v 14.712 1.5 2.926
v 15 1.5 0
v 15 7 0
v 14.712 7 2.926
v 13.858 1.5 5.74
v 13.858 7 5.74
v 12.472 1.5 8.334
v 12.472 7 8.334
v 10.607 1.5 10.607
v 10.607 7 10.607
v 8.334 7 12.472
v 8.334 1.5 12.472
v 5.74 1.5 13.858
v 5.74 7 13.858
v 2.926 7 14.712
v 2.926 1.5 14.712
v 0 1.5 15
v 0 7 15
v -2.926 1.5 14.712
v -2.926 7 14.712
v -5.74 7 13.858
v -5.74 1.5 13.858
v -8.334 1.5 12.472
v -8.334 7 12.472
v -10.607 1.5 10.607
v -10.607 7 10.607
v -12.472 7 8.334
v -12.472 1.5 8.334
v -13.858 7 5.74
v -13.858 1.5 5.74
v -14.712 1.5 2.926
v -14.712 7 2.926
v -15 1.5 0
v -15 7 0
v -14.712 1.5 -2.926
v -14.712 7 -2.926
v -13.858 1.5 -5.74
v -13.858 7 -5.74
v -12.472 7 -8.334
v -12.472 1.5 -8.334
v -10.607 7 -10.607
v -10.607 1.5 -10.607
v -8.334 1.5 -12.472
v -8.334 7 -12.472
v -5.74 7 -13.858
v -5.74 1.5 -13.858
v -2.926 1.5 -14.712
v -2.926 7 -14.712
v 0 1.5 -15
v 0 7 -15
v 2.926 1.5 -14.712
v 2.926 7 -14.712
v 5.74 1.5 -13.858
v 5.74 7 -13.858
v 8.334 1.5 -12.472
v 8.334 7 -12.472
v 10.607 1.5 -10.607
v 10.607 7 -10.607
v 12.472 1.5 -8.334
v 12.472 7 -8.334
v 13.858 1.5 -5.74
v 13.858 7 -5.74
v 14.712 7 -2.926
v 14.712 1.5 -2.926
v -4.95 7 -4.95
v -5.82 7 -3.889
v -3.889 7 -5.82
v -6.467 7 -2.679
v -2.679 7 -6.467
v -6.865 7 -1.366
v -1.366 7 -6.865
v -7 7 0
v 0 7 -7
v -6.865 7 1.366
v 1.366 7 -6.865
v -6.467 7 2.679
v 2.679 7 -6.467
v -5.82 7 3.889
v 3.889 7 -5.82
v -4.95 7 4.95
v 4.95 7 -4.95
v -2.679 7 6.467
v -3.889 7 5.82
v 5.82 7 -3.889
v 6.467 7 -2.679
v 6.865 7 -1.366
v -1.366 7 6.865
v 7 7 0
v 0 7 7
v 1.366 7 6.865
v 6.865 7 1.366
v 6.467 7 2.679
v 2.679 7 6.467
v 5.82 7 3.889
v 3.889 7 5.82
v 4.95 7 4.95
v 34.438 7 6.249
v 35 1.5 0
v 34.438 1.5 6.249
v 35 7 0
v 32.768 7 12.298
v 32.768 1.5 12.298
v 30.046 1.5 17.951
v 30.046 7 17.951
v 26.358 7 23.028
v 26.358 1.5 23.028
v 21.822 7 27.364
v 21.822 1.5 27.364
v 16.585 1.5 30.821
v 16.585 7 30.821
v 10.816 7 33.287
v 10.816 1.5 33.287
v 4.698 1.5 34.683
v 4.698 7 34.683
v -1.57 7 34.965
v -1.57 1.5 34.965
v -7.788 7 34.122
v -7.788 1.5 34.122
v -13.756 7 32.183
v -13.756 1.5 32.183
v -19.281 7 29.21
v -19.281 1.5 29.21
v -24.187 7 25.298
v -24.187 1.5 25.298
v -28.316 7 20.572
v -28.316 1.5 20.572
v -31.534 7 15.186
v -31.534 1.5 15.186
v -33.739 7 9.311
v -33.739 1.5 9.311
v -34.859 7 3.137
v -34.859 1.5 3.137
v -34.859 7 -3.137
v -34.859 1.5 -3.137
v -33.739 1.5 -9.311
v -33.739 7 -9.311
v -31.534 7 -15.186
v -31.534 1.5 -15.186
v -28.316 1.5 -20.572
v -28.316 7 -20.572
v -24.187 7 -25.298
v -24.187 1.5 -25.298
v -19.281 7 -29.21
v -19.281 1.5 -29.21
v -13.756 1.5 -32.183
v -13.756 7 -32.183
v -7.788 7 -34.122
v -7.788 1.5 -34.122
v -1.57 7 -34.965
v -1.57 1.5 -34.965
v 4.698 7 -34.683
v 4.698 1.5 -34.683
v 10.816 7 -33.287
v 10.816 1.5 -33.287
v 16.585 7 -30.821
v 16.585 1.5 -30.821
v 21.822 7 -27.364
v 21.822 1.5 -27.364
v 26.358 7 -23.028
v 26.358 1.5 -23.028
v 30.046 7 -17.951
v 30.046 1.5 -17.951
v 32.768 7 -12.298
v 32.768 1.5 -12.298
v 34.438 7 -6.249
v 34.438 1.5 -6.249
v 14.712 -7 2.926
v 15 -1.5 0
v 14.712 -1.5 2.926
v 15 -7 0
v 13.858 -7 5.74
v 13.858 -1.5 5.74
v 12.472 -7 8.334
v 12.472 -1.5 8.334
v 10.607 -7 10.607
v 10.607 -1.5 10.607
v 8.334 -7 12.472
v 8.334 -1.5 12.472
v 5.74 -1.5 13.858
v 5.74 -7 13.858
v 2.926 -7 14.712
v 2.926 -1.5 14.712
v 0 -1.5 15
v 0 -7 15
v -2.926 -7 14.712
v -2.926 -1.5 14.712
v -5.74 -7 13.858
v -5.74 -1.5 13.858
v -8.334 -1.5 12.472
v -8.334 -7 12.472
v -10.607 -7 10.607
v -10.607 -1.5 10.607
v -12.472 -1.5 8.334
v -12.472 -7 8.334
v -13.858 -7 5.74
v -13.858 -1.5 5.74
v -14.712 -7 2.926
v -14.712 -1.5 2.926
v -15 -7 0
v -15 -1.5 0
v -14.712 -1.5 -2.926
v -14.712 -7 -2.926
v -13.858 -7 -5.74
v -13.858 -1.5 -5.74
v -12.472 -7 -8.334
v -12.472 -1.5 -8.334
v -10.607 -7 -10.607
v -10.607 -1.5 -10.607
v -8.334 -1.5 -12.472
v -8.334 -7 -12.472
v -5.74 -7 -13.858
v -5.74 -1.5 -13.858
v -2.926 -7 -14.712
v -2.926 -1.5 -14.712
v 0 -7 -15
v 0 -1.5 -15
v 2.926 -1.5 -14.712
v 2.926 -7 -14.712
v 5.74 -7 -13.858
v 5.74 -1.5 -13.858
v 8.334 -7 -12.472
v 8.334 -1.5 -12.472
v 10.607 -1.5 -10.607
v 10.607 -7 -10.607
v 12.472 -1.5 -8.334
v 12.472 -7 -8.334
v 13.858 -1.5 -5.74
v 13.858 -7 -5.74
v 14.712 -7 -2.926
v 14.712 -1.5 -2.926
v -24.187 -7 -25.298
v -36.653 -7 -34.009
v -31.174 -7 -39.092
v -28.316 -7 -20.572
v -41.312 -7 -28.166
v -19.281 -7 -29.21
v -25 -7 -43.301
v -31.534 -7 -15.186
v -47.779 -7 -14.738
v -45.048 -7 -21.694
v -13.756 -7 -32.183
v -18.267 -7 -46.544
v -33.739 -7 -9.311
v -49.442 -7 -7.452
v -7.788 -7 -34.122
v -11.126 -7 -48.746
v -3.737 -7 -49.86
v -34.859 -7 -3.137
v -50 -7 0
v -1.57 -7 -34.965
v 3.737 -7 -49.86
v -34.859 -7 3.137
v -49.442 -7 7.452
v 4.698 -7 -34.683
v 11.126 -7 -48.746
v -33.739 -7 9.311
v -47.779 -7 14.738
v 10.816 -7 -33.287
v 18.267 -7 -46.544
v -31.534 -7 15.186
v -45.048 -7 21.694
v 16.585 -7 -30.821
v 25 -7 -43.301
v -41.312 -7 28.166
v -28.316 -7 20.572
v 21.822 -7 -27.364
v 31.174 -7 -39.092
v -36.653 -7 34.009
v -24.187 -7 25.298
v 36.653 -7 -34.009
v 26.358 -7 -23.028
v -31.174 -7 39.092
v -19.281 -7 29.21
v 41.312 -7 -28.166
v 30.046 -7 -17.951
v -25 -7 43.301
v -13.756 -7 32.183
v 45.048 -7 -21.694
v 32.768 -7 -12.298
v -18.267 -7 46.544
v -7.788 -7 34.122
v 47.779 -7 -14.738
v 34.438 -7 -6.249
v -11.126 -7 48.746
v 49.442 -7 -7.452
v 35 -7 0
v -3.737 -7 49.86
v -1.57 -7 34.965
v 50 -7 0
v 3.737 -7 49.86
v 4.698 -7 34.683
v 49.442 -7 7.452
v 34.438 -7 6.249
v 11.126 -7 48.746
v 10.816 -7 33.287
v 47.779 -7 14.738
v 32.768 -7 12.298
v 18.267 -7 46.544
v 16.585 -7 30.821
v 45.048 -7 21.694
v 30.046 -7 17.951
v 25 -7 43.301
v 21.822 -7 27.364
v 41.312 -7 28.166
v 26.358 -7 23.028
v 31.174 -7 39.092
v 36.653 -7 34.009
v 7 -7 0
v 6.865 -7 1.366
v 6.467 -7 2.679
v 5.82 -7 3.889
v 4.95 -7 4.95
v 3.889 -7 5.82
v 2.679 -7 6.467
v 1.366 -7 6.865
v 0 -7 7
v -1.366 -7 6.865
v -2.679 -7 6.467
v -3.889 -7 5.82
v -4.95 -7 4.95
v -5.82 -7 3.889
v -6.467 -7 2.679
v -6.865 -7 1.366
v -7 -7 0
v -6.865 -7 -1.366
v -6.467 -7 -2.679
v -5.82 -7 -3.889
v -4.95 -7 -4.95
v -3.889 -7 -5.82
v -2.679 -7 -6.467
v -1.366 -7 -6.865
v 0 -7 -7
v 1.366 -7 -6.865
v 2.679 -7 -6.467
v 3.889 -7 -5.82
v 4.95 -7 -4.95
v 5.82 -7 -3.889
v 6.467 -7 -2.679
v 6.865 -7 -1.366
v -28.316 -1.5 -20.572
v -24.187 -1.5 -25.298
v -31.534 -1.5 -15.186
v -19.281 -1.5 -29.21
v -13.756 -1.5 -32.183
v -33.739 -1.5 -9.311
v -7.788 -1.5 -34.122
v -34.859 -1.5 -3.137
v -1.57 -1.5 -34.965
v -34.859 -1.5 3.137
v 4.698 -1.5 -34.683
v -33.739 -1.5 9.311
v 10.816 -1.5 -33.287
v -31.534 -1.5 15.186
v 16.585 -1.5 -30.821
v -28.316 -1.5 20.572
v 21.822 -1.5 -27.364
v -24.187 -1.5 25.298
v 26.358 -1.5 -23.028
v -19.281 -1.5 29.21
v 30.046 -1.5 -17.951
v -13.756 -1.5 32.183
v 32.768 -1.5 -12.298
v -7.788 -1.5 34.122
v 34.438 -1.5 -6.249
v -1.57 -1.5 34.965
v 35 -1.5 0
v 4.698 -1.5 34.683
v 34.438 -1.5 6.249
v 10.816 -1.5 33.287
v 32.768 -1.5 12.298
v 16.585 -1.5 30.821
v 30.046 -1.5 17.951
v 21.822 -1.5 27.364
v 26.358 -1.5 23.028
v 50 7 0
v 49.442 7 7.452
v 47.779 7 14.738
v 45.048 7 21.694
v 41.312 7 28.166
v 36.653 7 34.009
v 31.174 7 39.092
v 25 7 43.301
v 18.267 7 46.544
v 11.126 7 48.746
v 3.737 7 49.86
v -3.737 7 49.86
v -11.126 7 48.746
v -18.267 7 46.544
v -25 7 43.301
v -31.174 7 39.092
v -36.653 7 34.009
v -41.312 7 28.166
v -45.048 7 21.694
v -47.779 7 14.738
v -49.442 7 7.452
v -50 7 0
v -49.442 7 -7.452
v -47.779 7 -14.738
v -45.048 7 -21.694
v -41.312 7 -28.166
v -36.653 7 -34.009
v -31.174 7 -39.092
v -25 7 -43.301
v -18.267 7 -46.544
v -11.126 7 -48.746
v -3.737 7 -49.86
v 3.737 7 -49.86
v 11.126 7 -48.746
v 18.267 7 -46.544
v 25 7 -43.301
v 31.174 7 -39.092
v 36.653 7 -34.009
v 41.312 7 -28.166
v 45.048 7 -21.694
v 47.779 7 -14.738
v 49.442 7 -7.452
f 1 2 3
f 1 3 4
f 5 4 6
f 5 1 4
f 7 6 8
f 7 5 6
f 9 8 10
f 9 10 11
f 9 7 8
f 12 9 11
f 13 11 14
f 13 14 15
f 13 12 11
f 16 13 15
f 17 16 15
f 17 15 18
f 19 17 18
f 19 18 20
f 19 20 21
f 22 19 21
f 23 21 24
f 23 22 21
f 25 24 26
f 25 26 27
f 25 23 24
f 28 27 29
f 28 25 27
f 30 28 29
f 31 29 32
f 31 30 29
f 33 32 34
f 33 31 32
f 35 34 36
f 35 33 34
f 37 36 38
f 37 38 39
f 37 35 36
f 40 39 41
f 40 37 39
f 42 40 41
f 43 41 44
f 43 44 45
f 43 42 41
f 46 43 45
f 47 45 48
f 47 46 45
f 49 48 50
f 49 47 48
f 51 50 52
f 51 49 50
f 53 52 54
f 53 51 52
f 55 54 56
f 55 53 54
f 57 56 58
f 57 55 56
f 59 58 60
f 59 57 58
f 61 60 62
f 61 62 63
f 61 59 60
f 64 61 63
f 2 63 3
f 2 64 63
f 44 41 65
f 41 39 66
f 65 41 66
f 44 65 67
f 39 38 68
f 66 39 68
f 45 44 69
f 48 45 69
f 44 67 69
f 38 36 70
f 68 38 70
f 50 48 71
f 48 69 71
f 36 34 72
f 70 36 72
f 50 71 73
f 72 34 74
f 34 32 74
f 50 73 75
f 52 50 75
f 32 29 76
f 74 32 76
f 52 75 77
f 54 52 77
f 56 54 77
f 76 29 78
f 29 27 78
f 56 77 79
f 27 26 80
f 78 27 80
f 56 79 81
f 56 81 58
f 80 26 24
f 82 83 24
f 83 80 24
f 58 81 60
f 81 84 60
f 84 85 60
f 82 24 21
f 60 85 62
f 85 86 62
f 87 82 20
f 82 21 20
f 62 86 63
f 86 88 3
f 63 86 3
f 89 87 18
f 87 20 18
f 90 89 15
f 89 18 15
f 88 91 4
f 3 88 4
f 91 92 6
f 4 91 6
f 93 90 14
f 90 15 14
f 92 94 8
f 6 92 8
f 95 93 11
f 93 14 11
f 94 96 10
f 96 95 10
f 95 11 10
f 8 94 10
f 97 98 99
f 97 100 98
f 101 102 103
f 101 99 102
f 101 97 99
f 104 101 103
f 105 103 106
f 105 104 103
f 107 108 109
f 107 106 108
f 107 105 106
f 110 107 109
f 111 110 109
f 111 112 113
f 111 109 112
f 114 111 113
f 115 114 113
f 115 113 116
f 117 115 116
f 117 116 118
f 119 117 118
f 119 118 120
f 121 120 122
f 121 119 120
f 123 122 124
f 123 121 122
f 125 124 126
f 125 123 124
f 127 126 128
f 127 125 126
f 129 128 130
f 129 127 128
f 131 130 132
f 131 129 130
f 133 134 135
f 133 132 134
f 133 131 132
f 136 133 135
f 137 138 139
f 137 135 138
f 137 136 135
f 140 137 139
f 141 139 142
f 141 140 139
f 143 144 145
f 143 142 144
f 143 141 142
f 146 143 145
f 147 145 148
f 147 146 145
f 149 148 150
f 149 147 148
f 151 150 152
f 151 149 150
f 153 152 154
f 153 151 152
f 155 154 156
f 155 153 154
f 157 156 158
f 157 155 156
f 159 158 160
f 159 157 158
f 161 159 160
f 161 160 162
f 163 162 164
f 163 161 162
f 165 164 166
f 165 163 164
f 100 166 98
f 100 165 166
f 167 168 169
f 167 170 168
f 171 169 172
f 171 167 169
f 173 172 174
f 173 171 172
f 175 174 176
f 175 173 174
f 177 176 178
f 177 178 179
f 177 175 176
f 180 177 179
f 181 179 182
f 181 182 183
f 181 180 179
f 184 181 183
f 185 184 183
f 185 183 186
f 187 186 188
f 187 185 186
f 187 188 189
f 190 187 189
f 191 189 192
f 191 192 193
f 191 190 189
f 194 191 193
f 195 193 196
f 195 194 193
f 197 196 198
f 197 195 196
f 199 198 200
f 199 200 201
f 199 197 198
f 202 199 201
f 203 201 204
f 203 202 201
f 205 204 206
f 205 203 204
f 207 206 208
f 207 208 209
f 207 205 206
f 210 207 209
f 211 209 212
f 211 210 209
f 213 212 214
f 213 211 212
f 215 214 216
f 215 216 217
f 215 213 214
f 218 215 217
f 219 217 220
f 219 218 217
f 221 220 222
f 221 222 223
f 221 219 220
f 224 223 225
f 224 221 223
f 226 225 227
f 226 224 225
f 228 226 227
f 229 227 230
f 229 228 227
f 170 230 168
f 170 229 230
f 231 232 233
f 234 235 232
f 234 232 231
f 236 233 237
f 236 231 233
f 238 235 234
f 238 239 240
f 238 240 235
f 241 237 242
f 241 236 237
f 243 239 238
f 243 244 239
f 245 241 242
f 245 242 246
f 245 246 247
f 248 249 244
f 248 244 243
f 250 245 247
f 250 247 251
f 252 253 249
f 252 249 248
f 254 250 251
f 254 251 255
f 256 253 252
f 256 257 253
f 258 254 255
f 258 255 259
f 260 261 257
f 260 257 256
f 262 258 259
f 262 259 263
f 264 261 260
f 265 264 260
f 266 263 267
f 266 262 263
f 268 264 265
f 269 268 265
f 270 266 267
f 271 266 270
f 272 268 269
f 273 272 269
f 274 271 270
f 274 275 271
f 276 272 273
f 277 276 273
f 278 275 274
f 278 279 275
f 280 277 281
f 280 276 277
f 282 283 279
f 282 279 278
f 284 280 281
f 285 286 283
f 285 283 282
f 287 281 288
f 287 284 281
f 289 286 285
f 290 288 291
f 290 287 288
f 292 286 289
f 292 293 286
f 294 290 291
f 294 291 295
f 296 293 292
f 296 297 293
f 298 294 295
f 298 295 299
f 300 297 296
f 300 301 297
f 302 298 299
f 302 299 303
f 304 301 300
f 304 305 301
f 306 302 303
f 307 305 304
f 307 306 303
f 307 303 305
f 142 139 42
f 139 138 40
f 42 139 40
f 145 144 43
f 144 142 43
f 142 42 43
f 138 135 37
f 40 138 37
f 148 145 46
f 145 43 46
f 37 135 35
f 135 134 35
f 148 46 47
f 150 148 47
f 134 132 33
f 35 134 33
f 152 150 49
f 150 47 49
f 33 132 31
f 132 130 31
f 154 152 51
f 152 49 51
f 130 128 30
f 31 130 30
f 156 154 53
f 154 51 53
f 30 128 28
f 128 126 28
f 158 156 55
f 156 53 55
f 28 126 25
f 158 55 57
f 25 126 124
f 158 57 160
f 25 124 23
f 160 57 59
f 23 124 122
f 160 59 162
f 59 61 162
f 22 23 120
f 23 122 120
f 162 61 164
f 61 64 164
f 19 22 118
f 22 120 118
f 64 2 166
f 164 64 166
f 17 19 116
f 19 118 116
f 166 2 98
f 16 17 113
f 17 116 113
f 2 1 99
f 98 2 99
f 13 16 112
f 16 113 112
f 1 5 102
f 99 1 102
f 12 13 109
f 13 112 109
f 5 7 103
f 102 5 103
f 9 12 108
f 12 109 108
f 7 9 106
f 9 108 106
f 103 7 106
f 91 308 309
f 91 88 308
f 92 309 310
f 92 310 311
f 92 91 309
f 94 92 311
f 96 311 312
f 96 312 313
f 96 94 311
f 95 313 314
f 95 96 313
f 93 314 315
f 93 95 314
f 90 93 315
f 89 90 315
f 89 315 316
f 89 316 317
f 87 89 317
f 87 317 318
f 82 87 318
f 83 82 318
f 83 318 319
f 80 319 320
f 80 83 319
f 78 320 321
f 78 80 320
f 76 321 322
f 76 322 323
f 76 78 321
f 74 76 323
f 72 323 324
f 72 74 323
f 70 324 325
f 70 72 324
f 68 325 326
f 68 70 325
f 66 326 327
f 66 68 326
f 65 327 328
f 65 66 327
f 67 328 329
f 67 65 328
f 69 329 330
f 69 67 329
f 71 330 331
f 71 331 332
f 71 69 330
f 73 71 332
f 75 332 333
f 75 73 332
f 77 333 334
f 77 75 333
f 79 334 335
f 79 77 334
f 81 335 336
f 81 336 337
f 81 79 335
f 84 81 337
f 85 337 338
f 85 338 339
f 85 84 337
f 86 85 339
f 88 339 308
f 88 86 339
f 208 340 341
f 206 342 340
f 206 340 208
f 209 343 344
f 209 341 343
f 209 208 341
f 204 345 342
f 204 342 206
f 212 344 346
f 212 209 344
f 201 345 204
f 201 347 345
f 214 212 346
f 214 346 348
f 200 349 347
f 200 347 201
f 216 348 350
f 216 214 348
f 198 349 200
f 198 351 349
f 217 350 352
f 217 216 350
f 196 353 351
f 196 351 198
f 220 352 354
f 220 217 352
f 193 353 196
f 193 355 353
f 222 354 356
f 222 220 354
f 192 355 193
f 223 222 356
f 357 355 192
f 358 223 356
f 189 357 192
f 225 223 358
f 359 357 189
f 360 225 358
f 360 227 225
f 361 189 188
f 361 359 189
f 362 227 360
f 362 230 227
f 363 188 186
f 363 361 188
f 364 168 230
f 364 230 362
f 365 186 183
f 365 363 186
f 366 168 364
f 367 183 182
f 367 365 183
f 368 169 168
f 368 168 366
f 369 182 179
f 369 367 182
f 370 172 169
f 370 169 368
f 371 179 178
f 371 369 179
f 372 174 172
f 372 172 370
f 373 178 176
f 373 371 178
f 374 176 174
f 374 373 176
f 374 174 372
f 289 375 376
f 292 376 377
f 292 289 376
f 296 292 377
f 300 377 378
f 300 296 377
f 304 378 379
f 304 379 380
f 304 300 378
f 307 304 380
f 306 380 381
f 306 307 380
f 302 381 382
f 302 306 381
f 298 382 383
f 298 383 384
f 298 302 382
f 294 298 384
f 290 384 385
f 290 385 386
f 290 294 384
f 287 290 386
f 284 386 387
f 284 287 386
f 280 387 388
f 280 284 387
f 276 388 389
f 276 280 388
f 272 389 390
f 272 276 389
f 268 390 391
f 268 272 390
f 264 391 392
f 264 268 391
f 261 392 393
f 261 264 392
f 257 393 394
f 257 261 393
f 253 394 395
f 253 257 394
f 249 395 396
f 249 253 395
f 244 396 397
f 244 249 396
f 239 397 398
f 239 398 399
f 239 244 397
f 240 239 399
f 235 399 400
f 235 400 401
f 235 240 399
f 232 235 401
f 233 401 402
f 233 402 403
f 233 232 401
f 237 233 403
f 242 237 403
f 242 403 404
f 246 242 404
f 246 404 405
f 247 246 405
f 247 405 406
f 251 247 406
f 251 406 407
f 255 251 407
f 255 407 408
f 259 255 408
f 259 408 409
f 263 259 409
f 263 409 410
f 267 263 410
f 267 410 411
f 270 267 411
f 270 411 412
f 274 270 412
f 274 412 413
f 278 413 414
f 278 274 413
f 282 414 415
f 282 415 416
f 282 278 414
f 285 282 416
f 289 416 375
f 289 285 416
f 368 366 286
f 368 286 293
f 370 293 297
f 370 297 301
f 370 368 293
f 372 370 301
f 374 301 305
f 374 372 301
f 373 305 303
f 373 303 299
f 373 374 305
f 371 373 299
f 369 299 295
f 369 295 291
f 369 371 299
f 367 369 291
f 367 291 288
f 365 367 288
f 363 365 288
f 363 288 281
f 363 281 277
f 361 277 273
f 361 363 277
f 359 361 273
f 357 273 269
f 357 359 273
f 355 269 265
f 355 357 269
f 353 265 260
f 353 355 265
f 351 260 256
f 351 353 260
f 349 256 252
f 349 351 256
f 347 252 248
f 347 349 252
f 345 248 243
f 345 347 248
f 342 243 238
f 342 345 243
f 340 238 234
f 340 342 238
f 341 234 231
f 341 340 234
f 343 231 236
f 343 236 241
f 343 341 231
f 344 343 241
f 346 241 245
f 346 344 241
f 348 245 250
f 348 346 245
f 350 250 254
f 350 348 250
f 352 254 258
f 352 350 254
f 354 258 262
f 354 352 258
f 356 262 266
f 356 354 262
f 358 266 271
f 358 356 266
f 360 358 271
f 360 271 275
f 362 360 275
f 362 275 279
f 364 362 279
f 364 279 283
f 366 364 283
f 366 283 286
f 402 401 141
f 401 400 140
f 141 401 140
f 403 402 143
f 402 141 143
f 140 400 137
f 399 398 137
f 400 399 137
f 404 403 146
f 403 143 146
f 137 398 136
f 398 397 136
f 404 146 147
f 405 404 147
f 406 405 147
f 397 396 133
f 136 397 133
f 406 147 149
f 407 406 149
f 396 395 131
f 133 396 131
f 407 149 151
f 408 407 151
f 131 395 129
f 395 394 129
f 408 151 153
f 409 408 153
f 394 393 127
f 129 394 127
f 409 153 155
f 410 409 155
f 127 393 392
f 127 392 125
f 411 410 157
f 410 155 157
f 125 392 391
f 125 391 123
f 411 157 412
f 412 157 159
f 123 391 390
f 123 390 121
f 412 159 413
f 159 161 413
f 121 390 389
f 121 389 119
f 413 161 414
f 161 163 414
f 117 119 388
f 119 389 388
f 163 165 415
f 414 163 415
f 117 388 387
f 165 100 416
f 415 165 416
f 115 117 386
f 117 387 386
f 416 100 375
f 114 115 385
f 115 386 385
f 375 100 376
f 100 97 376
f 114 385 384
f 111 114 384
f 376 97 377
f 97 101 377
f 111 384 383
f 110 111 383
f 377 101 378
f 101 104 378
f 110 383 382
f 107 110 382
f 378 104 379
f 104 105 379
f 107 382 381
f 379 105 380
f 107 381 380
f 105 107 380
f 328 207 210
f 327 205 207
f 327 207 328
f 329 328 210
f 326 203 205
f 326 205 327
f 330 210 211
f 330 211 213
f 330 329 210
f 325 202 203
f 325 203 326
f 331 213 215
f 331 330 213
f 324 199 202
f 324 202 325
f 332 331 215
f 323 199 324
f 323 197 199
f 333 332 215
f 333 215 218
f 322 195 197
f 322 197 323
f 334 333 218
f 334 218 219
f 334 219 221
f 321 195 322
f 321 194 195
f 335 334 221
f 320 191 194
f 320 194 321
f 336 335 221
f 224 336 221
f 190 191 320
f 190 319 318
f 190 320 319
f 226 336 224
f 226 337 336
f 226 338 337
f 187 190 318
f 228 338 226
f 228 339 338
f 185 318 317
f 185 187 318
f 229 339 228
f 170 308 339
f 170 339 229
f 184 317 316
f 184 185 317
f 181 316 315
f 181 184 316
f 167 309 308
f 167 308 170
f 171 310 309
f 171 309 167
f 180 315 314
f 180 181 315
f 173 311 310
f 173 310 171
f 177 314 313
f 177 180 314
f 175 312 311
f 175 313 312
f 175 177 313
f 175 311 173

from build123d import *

# Parameters (mm, degrees)
F0_R     = 35
F0_R_2   = 15
F1_DEPTH = 1.5
F1_TAPER = -3
F0_R_3   = 50
F2_DEPTH = 7
F0_R_4   = 7
F3_DEPTH = 7


with BuildPart() as f1:
    # F0 (on Front) → F1 (new body, symmetric)
    with BuildSketch(Plane.XZ):
        Circle(F0_R)
        Circle(F0_R_2, mode=Mode.SUBTRACT)
    extrude(amount=F1_DEPTH, both=True, taper=F1_TAPER)

    # F0 (on Front) → F2 (join, symmetric)
    with BuildSketch(Plane.XZ):
        Circle(F0_R_3)
        Circle(F0_R, mode=Mode.SUBTRACT)
    extrude(amount=F2_DEPTH, both=True)

    # F0 (on Front) → F3 (join, symmetric)
    with BuildSketch(Plane.XZ):
        Circle(F0_R_2)
        Circle(F0_R_4, mode=Mode.SUBTRACT)
    extrude(amount=F3_DEPTH, both=True)


solid = f1.part
